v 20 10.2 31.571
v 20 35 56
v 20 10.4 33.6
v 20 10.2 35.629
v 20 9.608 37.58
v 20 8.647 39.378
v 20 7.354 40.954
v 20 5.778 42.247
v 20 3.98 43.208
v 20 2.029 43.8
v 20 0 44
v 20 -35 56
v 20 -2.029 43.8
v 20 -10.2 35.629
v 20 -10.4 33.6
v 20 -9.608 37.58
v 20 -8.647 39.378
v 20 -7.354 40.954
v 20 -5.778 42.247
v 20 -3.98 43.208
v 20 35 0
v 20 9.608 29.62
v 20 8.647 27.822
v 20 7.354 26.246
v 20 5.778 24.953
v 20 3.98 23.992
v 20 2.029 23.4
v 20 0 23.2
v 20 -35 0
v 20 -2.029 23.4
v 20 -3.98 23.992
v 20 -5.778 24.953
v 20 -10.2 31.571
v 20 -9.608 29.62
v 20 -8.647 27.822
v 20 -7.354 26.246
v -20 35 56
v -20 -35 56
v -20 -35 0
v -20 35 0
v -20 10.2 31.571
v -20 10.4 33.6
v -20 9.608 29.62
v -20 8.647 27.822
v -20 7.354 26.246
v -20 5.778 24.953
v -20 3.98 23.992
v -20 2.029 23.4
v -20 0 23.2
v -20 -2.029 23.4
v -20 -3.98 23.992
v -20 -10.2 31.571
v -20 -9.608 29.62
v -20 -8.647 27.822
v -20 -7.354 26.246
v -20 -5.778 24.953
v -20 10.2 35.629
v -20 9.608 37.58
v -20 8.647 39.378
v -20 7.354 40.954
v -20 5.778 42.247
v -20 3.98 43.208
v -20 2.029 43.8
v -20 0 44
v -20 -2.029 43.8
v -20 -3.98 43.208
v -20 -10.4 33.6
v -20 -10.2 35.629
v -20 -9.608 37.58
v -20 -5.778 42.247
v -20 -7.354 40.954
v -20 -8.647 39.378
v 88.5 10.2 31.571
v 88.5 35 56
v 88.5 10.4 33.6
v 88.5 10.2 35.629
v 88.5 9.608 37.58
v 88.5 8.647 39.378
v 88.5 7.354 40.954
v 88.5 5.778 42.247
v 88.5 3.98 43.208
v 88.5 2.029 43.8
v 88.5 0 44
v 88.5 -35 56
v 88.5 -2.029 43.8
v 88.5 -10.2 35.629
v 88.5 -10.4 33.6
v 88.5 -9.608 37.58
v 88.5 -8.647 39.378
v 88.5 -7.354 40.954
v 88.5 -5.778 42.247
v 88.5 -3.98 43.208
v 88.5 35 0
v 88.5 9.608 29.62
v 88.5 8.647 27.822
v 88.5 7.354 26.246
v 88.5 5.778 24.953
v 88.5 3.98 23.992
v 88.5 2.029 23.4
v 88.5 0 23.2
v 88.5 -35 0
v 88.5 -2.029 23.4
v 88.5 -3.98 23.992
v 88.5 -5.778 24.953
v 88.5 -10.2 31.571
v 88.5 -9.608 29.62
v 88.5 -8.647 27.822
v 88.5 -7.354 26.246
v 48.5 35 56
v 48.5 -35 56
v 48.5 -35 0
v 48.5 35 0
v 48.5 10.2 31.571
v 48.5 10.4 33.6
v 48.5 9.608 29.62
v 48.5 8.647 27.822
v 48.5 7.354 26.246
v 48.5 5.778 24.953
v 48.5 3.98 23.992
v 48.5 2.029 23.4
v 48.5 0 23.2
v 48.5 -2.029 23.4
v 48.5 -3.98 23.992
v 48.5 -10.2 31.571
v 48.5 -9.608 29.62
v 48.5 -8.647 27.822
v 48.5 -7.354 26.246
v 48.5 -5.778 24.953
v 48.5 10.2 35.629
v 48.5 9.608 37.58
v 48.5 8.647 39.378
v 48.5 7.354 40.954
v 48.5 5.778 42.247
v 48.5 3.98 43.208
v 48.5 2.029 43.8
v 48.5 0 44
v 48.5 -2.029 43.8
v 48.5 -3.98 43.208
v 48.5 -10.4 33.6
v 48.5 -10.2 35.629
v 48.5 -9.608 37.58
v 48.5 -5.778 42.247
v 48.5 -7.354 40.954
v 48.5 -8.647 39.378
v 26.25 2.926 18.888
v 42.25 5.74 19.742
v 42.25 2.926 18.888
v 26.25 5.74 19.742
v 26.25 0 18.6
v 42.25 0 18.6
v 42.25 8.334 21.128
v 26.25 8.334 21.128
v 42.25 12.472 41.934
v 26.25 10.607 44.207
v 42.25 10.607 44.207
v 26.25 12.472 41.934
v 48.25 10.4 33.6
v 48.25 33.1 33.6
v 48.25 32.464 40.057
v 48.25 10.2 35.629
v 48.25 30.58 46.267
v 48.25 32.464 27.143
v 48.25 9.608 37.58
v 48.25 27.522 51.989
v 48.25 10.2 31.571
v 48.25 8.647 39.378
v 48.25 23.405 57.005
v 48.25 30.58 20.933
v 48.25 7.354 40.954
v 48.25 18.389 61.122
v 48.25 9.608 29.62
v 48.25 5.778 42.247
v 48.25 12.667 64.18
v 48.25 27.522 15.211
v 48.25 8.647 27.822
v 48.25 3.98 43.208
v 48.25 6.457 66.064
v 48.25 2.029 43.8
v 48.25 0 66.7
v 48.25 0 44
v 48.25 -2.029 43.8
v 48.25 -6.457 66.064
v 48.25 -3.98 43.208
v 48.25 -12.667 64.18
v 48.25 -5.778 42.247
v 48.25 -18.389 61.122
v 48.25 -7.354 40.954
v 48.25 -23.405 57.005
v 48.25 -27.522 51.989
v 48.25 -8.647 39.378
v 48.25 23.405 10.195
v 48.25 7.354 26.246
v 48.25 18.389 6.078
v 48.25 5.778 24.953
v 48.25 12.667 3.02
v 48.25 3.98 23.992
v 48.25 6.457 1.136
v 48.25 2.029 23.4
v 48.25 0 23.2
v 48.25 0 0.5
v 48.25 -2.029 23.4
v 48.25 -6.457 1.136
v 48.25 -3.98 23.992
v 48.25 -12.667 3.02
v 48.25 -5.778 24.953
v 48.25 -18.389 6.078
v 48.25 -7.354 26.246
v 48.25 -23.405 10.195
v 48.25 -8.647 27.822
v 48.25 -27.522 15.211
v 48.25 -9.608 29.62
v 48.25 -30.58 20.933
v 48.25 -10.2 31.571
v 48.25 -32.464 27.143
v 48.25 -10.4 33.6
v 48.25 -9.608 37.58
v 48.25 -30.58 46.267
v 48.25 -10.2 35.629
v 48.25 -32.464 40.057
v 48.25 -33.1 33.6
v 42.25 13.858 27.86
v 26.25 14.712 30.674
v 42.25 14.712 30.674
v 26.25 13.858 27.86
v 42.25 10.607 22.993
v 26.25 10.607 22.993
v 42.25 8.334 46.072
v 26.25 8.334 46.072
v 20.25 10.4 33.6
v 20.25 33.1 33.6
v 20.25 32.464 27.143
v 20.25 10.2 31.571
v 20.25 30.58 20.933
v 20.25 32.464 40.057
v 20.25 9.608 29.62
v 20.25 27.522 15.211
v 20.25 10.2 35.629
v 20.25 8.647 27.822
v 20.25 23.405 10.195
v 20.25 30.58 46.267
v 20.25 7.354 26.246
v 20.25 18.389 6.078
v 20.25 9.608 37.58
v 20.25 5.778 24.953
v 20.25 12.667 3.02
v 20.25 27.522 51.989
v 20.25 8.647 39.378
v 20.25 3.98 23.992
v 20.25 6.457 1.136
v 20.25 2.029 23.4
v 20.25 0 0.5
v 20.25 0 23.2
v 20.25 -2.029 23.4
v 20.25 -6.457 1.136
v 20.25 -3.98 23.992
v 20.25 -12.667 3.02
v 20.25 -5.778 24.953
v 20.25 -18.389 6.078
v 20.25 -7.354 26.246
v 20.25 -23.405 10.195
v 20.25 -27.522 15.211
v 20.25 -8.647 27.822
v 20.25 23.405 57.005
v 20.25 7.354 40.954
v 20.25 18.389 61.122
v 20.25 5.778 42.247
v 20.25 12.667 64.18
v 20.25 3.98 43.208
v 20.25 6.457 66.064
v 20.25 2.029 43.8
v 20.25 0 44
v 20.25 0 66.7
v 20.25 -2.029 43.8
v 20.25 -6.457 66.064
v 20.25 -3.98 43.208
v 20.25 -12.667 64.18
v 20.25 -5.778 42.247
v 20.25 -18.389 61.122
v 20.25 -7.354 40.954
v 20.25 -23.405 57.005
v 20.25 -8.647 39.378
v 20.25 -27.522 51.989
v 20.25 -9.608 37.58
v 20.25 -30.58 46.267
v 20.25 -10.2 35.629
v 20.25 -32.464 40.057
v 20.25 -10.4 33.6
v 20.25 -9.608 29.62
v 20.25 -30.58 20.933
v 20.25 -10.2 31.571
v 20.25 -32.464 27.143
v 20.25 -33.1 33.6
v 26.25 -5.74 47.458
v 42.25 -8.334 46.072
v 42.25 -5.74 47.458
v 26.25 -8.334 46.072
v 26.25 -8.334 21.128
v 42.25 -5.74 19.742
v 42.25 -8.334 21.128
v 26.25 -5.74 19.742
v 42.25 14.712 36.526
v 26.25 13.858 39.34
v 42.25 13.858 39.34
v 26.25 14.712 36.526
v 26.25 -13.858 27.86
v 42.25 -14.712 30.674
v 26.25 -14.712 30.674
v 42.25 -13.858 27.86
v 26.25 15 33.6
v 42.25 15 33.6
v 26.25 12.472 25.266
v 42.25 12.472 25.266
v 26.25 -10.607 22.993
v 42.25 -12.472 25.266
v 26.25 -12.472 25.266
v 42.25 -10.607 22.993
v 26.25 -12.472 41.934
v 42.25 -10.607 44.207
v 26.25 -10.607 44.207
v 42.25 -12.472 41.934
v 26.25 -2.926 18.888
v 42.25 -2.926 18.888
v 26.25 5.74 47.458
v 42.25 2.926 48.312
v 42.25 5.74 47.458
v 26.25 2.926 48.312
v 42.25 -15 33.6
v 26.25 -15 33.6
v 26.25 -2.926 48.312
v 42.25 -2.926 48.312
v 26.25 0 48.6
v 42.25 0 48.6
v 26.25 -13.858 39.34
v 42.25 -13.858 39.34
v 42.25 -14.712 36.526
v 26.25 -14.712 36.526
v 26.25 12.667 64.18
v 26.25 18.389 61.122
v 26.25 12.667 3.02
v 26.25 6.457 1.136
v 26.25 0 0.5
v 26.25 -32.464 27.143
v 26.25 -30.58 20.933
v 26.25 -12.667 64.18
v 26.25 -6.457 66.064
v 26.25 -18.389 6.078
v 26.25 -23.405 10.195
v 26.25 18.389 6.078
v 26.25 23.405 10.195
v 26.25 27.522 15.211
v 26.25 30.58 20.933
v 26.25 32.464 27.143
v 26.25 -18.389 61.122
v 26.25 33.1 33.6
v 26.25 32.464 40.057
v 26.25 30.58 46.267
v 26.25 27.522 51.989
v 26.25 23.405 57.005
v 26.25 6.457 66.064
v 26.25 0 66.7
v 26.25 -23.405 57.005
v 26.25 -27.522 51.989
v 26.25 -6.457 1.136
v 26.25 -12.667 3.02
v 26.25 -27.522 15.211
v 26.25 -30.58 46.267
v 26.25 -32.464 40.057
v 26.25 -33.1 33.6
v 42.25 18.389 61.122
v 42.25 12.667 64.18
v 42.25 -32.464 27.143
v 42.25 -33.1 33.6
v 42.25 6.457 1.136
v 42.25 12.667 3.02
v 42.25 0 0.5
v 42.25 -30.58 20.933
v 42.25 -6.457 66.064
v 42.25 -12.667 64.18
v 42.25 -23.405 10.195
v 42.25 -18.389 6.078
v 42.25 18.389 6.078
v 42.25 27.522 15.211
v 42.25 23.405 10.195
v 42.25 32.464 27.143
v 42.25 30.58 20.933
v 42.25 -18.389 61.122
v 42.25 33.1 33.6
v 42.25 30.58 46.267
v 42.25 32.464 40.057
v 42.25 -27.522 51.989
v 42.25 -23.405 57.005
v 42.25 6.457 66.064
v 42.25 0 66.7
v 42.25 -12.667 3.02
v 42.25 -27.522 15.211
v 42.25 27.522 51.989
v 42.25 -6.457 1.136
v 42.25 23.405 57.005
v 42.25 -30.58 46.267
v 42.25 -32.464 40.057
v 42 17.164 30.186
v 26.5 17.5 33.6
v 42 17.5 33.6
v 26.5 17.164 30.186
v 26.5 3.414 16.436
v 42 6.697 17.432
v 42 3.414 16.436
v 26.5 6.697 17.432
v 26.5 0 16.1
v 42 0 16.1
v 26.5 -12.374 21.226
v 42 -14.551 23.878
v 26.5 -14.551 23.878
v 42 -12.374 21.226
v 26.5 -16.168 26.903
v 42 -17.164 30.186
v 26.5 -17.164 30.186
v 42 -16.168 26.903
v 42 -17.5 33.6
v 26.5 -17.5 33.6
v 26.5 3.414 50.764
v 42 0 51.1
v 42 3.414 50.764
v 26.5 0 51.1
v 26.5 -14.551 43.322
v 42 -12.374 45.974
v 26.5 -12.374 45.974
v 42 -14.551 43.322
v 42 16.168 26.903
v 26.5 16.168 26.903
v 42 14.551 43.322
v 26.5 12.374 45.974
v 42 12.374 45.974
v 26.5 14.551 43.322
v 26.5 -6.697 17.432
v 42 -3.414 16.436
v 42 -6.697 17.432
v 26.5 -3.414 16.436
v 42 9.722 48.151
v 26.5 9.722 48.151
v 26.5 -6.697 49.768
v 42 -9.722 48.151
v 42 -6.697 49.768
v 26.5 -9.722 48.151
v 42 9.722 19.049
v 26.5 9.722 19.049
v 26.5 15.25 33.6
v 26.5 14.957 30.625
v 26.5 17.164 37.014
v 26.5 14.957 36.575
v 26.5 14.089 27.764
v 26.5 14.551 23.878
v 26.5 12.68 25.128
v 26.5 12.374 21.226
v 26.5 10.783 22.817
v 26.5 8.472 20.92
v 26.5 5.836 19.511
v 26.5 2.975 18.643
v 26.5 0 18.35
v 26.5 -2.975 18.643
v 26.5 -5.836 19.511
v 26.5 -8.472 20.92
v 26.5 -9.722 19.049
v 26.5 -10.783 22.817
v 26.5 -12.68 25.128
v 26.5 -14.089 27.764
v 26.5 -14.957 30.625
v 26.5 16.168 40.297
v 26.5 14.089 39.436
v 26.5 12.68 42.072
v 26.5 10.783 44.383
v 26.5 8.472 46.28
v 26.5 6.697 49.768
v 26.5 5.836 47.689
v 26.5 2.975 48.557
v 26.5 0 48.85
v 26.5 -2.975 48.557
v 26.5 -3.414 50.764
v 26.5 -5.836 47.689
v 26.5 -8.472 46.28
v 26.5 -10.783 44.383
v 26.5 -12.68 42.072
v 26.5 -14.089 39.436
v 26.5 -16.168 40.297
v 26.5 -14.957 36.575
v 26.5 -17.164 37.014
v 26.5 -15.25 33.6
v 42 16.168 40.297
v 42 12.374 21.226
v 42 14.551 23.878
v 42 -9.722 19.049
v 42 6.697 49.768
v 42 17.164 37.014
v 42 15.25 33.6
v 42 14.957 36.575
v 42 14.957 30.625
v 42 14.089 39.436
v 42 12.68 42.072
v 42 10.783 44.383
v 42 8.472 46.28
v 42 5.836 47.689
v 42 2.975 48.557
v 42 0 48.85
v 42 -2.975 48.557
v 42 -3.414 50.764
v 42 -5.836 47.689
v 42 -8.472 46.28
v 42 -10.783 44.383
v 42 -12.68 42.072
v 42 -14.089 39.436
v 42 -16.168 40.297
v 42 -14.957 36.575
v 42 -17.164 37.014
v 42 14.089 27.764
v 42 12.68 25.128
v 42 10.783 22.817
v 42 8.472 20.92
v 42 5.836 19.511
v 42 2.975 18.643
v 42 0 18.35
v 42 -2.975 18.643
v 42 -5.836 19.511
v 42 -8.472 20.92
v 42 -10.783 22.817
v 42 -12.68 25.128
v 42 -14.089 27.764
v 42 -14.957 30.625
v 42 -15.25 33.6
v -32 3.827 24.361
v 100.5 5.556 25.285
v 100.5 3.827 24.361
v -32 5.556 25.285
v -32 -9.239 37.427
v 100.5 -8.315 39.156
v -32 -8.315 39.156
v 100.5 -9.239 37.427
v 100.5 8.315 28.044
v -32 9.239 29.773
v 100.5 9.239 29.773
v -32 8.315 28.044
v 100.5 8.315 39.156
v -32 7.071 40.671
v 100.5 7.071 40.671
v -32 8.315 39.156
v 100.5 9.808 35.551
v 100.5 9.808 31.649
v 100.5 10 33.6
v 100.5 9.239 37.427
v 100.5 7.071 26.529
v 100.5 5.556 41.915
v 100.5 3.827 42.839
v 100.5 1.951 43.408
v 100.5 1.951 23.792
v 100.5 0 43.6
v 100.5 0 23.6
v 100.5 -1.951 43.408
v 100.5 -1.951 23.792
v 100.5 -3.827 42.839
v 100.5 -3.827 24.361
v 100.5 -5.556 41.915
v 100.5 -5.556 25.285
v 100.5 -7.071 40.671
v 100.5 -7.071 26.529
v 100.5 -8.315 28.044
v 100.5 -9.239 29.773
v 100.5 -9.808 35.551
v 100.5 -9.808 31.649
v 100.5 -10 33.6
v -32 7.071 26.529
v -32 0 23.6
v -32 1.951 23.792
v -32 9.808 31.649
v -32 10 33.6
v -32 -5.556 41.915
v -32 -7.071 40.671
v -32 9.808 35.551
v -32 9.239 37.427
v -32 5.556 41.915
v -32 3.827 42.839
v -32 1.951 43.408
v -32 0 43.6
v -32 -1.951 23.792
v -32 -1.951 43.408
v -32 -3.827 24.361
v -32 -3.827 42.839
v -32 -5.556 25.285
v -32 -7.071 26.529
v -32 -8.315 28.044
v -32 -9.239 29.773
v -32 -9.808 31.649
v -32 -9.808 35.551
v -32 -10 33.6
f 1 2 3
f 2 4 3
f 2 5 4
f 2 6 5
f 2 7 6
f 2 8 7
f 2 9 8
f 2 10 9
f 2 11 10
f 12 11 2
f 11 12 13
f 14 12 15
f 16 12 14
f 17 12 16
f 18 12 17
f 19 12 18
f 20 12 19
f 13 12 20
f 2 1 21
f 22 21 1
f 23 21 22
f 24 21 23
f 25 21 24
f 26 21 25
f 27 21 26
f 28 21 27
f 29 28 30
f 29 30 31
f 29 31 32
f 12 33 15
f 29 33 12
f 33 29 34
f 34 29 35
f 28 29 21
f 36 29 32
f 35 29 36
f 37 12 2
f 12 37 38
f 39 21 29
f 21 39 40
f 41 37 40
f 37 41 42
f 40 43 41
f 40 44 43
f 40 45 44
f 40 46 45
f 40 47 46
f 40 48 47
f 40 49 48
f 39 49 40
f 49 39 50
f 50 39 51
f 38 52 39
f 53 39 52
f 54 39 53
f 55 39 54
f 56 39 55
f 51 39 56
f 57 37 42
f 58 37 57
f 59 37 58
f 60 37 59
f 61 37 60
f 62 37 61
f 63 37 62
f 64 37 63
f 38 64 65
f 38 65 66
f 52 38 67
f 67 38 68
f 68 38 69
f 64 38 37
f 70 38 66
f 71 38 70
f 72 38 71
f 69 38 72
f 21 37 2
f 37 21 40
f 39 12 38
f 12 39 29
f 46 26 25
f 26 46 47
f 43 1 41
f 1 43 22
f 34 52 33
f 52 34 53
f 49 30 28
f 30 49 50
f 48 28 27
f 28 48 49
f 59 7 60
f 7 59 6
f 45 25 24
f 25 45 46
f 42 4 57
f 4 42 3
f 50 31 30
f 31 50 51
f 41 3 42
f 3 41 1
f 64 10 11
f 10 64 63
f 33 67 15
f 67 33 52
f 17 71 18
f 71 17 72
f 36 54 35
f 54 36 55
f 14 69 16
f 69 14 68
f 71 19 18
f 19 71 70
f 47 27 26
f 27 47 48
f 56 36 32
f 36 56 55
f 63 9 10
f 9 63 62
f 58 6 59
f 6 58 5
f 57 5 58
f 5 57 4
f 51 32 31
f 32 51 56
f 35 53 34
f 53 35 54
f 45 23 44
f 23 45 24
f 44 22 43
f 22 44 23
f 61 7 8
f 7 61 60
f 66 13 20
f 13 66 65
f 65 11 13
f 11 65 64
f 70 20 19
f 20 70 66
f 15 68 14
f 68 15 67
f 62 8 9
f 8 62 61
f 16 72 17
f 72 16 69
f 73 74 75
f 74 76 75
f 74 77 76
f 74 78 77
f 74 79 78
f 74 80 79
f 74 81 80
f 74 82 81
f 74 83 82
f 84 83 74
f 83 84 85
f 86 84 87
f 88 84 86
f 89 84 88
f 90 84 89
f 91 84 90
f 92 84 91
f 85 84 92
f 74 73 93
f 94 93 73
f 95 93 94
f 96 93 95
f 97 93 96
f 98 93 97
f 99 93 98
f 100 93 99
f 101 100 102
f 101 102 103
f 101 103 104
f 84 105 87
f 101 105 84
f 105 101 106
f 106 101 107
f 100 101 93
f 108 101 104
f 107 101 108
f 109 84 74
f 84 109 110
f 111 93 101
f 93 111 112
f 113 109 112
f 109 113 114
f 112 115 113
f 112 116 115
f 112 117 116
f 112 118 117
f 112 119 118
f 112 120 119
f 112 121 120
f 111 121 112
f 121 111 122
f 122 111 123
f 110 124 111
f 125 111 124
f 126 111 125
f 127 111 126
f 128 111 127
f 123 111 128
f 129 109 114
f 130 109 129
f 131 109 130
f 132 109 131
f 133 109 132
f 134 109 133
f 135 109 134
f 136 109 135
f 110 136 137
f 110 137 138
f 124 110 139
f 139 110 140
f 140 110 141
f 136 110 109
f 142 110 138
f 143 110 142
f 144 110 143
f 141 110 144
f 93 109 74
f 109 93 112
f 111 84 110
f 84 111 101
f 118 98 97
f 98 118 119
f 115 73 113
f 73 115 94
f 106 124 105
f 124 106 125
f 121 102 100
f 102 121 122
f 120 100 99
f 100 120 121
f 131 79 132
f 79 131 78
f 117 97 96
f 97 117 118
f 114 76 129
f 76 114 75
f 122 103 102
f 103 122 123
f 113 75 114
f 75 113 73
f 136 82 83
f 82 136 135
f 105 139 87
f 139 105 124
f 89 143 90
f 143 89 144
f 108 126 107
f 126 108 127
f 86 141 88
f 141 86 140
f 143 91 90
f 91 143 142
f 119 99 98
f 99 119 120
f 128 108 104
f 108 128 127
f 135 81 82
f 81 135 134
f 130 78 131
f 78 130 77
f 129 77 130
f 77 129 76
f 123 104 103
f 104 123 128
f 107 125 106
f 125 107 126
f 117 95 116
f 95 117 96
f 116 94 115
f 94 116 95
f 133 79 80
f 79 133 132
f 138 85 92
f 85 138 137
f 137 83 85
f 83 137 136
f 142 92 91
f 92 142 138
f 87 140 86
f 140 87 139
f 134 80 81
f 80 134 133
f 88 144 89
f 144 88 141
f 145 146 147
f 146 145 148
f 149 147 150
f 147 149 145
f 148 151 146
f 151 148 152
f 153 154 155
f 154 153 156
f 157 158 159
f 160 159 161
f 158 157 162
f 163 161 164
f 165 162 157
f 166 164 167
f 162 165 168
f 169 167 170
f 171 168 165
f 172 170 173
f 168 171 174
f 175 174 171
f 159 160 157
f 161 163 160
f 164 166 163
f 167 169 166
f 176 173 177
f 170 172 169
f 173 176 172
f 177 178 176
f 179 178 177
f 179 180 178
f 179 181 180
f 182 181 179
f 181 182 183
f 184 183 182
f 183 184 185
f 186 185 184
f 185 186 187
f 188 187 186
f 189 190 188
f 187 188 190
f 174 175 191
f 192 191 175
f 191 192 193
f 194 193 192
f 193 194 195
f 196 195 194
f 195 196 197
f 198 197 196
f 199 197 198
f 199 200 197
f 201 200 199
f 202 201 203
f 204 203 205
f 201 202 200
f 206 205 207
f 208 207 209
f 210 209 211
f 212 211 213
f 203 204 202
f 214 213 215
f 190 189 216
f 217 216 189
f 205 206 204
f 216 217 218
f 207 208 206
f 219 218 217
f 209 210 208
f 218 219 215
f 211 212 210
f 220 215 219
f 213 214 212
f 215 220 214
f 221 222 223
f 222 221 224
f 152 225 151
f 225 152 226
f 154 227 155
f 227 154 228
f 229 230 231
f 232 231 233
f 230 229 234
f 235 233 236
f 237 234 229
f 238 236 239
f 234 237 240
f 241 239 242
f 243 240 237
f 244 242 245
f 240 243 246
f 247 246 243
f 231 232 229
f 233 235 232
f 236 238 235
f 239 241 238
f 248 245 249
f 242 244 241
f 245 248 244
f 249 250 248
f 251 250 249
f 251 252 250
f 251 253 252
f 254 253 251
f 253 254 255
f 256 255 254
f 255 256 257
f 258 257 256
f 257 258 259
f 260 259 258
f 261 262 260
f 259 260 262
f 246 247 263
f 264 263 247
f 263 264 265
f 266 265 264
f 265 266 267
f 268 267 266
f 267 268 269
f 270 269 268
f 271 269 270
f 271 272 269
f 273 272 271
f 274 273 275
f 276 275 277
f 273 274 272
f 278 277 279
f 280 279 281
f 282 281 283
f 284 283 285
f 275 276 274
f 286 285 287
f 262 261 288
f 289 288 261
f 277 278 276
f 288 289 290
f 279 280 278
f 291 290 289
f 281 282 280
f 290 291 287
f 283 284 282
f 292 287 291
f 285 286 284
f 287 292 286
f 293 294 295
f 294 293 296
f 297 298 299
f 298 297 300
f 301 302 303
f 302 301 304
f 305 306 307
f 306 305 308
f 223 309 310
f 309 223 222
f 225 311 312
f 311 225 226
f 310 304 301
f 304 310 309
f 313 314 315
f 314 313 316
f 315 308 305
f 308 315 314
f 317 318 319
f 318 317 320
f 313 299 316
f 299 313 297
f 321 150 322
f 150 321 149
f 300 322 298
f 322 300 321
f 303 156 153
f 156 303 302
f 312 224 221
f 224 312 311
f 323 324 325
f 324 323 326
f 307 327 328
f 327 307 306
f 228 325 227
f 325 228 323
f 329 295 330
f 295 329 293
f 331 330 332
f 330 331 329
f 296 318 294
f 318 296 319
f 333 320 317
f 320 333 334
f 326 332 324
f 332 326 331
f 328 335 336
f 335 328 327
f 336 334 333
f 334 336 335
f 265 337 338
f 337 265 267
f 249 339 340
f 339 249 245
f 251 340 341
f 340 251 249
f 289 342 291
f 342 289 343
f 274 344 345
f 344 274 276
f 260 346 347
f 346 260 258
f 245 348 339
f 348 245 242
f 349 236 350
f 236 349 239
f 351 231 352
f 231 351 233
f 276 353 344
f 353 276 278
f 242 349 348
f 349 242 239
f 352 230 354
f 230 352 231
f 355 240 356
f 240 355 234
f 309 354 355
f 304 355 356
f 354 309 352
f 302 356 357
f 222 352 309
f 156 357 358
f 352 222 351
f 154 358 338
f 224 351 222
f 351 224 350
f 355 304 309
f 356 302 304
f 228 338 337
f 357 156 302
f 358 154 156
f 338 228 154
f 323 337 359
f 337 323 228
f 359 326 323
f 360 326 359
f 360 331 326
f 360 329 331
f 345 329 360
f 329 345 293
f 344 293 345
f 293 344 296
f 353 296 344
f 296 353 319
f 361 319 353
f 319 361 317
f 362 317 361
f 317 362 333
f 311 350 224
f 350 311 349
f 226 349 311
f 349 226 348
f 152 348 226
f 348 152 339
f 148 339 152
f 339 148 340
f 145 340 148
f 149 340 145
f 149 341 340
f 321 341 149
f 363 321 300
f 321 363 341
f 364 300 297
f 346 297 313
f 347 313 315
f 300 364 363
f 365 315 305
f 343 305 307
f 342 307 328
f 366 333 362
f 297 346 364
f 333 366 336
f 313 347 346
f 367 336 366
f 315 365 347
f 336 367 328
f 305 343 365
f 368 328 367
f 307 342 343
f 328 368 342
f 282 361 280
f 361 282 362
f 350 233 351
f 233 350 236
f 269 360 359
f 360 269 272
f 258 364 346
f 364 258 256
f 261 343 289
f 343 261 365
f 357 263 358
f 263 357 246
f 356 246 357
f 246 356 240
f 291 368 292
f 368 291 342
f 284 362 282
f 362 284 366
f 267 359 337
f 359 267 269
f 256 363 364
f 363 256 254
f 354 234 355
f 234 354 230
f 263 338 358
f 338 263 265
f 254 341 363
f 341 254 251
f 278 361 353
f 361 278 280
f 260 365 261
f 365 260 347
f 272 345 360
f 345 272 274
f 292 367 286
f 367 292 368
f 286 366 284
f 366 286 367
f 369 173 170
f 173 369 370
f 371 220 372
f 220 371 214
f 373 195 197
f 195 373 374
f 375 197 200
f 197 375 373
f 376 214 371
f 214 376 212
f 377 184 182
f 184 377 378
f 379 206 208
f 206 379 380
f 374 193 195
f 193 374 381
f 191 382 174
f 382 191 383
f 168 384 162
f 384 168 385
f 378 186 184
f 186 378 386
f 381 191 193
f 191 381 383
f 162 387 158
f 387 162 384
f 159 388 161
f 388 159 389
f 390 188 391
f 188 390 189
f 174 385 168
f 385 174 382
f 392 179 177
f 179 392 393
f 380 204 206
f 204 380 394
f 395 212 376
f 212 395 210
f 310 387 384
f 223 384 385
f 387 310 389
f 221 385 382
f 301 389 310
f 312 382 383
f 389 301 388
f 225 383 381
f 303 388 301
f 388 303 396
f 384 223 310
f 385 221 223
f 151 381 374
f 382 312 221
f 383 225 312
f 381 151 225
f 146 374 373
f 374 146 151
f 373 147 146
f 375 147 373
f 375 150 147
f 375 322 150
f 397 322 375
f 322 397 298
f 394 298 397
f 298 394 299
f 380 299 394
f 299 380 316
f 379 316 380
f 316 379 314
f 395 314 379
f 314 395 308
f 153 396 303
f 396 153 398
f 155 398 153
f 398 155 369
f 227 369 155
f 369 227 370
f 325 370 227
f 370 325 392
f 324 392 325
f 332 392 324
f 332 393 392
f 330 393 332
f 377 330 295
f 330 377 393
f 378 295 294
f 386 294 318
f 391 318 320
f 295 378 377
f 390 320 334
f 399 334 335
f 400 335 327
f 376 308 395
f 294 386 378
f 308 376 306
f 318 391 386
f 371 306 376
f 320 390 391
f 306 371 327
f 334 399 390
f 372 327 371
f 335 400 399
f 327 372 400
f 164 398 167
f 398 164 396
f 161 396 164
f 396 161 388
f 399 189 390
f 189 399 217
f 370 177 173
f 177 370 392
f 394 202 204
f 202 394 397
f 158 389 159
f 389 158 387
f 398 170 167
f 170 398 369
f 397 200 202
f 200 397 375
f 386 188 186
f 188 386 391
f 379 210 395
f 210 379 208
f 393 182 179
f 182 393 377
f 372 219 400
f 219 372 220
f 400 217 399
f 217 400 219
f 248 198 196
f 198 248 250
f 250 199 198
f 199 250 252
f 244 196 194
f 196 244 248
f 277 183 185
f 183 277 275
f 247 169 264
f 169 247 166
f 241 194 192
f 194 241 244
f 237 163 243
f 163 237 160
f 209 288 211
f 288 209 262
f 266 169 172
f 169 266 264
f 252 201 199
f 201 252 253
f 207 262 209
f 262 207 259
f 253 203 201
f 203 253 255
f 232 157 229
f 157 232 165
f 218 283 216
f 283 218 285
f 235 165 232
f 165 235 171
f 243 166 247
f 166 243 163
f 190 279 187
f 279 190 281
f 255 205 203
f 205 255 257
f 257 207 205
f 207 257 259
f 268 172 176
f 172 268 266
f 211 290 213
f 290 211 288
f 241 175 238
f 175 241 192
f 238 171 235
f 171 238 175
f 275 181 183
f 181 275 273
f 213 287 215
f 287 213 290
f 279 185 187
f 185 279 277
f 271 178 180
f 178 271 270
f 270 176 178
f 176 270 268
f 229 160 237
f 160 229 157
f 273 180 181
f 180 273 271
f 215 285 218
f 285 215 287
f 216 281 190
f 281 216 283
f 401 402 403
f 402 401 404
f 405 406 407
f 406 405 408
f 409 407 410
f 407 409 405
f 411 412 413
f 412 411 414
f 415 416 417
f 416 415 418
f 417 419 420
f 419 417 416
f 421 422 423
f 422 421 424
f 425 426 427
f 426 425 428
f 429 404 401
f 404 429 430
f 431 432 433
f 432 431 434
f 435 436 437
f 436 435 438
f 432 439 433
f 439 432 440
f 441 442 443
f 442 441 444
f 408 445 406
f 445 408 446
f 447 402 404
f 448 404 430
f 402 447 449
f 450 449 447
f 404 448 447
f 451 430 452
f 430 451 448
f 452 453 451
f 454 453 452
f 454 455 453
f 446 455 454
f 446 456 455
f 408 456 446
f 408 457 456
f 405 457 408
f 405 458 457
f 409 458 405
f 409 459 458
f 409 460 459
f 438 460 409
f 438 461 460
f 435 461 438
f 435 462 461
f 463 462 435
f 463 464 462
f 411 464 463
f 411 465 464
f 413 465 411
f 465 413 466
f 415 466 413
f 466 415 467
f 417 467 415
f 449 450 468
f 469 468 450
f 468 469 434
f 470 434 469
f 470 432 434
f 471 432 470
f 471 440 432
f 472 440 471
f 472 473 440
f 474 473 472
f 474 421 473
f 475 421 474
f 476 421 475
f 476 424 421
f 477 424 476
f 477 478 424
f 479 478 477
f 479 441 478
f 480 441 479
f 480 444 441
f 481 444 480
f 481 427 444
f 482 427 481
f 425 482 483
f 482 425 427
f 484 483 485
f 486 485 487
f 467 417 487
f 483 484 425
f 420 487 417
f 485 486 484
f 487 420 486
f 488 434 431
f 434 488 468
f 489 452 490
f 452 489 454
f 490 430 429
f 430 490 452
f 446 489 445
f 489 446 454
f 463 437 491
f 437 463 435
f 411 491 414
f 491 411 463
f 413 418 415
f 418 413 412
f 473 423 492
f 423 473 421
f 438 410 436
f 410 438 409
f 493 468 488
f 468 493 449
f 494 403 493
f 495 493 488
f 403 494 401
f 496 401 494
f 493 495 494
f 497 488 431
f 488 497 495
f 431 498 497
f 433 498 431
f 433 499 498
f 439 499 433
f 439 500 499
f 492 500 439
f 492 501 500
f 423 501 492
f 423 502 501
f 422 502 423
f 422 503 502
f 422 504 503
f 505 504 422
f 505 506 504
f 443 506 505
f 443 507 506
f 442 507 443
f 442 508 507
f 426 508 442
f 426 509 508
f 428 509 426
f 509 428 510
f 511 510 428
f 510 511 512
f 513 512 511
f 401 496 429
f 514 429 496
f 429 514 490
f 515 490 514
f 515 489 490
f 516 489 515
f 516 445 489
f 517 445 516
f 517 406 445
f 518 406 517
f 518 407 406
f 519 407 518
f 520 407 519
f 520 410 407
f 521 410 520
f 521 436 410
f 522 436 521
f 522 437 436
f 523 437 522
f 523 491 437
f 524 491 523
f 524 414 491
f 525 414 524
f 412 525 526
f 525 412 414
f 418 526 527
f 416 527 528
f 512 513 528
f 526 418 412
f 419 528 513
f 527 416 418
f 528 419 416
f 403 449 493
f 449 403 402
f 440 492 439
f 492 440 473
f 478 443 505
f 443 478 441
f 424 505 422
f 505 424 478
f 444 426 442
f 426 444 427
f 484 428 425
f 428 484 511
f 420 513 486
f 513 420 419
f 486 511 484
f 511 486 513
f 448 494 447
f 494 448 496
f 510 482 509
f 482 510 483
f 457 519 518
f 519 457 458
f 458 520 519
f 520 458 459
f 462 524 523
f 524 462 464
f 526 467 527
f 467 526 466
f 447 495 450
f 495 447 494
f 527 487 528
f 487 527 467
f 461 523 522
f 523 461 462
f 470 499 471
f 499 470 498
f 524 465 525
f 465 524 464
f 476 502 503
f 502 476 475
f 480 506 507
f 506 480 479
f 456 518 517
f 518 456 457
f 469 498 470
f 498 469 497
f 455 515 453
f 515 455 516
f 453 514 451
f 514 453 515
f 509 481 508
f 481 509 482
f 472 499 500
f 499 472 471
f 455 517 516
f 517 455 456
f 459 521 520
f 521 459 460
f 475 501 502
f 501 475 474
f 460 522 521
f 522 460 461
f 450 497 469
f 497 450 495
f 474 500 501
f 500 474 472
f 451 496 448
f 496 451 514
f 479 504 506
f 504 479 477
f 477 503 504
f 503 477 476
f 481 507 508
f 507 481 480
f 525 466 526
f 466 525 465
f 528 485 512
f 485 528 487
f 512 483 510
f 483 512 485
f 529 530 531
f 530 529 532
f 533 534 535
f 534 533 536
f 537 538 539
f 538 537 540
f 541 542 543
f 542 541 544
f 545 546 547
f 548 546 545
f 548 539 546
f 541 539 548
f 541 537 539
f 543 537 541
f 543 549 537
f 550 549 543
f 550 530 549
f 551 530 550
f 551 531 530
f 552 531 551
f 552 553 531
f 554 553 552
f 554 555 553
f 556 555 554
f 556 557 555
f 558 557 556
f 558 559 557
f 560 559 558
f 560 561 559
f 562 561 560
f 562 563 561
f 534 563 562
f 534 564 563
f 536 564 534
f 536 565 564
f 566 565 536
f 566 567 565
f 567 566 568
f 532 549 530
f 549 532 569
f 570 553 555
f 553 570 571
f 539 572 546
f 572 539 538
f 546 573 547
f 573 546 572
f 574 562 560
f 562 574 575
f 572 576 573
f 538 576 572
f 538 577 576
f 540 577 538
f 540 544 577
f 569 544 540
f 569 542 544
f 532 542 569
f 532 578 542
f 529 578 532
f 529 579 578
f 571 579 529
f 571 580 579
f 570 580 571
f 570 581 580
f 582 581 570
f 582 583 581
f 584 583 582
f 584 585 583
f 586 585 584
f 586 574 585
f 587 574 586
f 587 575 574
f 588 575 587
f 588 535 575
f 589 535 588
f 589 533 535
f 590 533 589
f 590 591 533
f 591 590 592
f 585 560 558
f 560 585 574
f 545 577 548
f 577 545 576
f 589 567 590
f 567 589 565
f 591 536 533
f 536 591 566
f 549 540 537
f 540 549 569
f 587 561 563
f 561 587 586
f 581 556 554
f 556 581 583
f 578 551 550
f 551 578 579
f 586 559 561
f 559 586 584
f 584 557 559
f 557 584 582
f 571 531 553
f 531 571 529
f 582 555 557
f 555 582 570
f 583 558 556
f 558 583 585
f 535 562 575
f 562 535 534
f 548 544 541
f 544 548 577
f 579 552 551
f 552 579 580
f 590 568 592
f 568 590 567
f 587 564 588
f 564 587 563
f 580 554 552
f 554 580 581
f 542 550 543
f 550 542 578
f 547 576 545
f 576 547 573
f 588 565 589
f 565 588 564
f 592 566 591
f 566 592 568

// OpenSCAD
$fn = 32;

// ------------------------------------------------------------------------
// Pulley assembly: d66.2 pulley with a belt, shaft d20
// Every part is its own module, assembly() places them once.
// ------------------------------------------------------------------------

// --- part 1 ---
module support1() {
  difference() {
    translate([-20, -35, 0]) cube([40, 70, 56]);
    translate([0, 0, 33.6]) rotate([0, 90, 0]) cylinder(h = 42, d = 20.8, center = true);
  }
}

// --- part 2 ---
module support2() {
  difference() {
    translate([-20, -35, 0]) cube([40, 70, 56]);
    translate([0, 0, 33.6]) rotate([0, 90, 0]) cylinder(h = 42, d = 20.8, center = true);
  }
}

// --- part 3 ---
module shaft() {
  translate([0, 0, -66.25]) cylinder(h = 132.5, d = 20);
}

// --- part 4 ---
module pulley() {
  difference() {
    union() {
      cylinder(h = 28, d = 30);
      cylinder(h = 6, d = 66.2);
      translate([0, 0, 22]) cylinder(h = 6, d = 66.2);
    }
    translate([0, 0, -1]) cylinder(h = 30, d = 20.8);
  }
}

// --- part 5 ---
module belt() {
  difference() {
      translate([0, 0, 0]) cylinder(h = 15.5, d = 35);
      translate([0, 0, -1]) cylinder(h = 17.5, d = 30.5);
    }
}

// --- assembly ---
module assembly() {
  translate([0, 0, 0]) rotate([0, 0, 0]) support1();
  translate([68.5, 0, 0]) rotate([0, 0, 0]) support2();
  translate([34.25, 0, 33.6]) rotate([0, 90, 0]) shaft();
  translate([20.25, 0, 33.6]) rotate([0, 90, 0]) pulley();
  translate([26.5, 0, 33.6]) rotate([0, 90, 0]) belt();
}

assembly();
